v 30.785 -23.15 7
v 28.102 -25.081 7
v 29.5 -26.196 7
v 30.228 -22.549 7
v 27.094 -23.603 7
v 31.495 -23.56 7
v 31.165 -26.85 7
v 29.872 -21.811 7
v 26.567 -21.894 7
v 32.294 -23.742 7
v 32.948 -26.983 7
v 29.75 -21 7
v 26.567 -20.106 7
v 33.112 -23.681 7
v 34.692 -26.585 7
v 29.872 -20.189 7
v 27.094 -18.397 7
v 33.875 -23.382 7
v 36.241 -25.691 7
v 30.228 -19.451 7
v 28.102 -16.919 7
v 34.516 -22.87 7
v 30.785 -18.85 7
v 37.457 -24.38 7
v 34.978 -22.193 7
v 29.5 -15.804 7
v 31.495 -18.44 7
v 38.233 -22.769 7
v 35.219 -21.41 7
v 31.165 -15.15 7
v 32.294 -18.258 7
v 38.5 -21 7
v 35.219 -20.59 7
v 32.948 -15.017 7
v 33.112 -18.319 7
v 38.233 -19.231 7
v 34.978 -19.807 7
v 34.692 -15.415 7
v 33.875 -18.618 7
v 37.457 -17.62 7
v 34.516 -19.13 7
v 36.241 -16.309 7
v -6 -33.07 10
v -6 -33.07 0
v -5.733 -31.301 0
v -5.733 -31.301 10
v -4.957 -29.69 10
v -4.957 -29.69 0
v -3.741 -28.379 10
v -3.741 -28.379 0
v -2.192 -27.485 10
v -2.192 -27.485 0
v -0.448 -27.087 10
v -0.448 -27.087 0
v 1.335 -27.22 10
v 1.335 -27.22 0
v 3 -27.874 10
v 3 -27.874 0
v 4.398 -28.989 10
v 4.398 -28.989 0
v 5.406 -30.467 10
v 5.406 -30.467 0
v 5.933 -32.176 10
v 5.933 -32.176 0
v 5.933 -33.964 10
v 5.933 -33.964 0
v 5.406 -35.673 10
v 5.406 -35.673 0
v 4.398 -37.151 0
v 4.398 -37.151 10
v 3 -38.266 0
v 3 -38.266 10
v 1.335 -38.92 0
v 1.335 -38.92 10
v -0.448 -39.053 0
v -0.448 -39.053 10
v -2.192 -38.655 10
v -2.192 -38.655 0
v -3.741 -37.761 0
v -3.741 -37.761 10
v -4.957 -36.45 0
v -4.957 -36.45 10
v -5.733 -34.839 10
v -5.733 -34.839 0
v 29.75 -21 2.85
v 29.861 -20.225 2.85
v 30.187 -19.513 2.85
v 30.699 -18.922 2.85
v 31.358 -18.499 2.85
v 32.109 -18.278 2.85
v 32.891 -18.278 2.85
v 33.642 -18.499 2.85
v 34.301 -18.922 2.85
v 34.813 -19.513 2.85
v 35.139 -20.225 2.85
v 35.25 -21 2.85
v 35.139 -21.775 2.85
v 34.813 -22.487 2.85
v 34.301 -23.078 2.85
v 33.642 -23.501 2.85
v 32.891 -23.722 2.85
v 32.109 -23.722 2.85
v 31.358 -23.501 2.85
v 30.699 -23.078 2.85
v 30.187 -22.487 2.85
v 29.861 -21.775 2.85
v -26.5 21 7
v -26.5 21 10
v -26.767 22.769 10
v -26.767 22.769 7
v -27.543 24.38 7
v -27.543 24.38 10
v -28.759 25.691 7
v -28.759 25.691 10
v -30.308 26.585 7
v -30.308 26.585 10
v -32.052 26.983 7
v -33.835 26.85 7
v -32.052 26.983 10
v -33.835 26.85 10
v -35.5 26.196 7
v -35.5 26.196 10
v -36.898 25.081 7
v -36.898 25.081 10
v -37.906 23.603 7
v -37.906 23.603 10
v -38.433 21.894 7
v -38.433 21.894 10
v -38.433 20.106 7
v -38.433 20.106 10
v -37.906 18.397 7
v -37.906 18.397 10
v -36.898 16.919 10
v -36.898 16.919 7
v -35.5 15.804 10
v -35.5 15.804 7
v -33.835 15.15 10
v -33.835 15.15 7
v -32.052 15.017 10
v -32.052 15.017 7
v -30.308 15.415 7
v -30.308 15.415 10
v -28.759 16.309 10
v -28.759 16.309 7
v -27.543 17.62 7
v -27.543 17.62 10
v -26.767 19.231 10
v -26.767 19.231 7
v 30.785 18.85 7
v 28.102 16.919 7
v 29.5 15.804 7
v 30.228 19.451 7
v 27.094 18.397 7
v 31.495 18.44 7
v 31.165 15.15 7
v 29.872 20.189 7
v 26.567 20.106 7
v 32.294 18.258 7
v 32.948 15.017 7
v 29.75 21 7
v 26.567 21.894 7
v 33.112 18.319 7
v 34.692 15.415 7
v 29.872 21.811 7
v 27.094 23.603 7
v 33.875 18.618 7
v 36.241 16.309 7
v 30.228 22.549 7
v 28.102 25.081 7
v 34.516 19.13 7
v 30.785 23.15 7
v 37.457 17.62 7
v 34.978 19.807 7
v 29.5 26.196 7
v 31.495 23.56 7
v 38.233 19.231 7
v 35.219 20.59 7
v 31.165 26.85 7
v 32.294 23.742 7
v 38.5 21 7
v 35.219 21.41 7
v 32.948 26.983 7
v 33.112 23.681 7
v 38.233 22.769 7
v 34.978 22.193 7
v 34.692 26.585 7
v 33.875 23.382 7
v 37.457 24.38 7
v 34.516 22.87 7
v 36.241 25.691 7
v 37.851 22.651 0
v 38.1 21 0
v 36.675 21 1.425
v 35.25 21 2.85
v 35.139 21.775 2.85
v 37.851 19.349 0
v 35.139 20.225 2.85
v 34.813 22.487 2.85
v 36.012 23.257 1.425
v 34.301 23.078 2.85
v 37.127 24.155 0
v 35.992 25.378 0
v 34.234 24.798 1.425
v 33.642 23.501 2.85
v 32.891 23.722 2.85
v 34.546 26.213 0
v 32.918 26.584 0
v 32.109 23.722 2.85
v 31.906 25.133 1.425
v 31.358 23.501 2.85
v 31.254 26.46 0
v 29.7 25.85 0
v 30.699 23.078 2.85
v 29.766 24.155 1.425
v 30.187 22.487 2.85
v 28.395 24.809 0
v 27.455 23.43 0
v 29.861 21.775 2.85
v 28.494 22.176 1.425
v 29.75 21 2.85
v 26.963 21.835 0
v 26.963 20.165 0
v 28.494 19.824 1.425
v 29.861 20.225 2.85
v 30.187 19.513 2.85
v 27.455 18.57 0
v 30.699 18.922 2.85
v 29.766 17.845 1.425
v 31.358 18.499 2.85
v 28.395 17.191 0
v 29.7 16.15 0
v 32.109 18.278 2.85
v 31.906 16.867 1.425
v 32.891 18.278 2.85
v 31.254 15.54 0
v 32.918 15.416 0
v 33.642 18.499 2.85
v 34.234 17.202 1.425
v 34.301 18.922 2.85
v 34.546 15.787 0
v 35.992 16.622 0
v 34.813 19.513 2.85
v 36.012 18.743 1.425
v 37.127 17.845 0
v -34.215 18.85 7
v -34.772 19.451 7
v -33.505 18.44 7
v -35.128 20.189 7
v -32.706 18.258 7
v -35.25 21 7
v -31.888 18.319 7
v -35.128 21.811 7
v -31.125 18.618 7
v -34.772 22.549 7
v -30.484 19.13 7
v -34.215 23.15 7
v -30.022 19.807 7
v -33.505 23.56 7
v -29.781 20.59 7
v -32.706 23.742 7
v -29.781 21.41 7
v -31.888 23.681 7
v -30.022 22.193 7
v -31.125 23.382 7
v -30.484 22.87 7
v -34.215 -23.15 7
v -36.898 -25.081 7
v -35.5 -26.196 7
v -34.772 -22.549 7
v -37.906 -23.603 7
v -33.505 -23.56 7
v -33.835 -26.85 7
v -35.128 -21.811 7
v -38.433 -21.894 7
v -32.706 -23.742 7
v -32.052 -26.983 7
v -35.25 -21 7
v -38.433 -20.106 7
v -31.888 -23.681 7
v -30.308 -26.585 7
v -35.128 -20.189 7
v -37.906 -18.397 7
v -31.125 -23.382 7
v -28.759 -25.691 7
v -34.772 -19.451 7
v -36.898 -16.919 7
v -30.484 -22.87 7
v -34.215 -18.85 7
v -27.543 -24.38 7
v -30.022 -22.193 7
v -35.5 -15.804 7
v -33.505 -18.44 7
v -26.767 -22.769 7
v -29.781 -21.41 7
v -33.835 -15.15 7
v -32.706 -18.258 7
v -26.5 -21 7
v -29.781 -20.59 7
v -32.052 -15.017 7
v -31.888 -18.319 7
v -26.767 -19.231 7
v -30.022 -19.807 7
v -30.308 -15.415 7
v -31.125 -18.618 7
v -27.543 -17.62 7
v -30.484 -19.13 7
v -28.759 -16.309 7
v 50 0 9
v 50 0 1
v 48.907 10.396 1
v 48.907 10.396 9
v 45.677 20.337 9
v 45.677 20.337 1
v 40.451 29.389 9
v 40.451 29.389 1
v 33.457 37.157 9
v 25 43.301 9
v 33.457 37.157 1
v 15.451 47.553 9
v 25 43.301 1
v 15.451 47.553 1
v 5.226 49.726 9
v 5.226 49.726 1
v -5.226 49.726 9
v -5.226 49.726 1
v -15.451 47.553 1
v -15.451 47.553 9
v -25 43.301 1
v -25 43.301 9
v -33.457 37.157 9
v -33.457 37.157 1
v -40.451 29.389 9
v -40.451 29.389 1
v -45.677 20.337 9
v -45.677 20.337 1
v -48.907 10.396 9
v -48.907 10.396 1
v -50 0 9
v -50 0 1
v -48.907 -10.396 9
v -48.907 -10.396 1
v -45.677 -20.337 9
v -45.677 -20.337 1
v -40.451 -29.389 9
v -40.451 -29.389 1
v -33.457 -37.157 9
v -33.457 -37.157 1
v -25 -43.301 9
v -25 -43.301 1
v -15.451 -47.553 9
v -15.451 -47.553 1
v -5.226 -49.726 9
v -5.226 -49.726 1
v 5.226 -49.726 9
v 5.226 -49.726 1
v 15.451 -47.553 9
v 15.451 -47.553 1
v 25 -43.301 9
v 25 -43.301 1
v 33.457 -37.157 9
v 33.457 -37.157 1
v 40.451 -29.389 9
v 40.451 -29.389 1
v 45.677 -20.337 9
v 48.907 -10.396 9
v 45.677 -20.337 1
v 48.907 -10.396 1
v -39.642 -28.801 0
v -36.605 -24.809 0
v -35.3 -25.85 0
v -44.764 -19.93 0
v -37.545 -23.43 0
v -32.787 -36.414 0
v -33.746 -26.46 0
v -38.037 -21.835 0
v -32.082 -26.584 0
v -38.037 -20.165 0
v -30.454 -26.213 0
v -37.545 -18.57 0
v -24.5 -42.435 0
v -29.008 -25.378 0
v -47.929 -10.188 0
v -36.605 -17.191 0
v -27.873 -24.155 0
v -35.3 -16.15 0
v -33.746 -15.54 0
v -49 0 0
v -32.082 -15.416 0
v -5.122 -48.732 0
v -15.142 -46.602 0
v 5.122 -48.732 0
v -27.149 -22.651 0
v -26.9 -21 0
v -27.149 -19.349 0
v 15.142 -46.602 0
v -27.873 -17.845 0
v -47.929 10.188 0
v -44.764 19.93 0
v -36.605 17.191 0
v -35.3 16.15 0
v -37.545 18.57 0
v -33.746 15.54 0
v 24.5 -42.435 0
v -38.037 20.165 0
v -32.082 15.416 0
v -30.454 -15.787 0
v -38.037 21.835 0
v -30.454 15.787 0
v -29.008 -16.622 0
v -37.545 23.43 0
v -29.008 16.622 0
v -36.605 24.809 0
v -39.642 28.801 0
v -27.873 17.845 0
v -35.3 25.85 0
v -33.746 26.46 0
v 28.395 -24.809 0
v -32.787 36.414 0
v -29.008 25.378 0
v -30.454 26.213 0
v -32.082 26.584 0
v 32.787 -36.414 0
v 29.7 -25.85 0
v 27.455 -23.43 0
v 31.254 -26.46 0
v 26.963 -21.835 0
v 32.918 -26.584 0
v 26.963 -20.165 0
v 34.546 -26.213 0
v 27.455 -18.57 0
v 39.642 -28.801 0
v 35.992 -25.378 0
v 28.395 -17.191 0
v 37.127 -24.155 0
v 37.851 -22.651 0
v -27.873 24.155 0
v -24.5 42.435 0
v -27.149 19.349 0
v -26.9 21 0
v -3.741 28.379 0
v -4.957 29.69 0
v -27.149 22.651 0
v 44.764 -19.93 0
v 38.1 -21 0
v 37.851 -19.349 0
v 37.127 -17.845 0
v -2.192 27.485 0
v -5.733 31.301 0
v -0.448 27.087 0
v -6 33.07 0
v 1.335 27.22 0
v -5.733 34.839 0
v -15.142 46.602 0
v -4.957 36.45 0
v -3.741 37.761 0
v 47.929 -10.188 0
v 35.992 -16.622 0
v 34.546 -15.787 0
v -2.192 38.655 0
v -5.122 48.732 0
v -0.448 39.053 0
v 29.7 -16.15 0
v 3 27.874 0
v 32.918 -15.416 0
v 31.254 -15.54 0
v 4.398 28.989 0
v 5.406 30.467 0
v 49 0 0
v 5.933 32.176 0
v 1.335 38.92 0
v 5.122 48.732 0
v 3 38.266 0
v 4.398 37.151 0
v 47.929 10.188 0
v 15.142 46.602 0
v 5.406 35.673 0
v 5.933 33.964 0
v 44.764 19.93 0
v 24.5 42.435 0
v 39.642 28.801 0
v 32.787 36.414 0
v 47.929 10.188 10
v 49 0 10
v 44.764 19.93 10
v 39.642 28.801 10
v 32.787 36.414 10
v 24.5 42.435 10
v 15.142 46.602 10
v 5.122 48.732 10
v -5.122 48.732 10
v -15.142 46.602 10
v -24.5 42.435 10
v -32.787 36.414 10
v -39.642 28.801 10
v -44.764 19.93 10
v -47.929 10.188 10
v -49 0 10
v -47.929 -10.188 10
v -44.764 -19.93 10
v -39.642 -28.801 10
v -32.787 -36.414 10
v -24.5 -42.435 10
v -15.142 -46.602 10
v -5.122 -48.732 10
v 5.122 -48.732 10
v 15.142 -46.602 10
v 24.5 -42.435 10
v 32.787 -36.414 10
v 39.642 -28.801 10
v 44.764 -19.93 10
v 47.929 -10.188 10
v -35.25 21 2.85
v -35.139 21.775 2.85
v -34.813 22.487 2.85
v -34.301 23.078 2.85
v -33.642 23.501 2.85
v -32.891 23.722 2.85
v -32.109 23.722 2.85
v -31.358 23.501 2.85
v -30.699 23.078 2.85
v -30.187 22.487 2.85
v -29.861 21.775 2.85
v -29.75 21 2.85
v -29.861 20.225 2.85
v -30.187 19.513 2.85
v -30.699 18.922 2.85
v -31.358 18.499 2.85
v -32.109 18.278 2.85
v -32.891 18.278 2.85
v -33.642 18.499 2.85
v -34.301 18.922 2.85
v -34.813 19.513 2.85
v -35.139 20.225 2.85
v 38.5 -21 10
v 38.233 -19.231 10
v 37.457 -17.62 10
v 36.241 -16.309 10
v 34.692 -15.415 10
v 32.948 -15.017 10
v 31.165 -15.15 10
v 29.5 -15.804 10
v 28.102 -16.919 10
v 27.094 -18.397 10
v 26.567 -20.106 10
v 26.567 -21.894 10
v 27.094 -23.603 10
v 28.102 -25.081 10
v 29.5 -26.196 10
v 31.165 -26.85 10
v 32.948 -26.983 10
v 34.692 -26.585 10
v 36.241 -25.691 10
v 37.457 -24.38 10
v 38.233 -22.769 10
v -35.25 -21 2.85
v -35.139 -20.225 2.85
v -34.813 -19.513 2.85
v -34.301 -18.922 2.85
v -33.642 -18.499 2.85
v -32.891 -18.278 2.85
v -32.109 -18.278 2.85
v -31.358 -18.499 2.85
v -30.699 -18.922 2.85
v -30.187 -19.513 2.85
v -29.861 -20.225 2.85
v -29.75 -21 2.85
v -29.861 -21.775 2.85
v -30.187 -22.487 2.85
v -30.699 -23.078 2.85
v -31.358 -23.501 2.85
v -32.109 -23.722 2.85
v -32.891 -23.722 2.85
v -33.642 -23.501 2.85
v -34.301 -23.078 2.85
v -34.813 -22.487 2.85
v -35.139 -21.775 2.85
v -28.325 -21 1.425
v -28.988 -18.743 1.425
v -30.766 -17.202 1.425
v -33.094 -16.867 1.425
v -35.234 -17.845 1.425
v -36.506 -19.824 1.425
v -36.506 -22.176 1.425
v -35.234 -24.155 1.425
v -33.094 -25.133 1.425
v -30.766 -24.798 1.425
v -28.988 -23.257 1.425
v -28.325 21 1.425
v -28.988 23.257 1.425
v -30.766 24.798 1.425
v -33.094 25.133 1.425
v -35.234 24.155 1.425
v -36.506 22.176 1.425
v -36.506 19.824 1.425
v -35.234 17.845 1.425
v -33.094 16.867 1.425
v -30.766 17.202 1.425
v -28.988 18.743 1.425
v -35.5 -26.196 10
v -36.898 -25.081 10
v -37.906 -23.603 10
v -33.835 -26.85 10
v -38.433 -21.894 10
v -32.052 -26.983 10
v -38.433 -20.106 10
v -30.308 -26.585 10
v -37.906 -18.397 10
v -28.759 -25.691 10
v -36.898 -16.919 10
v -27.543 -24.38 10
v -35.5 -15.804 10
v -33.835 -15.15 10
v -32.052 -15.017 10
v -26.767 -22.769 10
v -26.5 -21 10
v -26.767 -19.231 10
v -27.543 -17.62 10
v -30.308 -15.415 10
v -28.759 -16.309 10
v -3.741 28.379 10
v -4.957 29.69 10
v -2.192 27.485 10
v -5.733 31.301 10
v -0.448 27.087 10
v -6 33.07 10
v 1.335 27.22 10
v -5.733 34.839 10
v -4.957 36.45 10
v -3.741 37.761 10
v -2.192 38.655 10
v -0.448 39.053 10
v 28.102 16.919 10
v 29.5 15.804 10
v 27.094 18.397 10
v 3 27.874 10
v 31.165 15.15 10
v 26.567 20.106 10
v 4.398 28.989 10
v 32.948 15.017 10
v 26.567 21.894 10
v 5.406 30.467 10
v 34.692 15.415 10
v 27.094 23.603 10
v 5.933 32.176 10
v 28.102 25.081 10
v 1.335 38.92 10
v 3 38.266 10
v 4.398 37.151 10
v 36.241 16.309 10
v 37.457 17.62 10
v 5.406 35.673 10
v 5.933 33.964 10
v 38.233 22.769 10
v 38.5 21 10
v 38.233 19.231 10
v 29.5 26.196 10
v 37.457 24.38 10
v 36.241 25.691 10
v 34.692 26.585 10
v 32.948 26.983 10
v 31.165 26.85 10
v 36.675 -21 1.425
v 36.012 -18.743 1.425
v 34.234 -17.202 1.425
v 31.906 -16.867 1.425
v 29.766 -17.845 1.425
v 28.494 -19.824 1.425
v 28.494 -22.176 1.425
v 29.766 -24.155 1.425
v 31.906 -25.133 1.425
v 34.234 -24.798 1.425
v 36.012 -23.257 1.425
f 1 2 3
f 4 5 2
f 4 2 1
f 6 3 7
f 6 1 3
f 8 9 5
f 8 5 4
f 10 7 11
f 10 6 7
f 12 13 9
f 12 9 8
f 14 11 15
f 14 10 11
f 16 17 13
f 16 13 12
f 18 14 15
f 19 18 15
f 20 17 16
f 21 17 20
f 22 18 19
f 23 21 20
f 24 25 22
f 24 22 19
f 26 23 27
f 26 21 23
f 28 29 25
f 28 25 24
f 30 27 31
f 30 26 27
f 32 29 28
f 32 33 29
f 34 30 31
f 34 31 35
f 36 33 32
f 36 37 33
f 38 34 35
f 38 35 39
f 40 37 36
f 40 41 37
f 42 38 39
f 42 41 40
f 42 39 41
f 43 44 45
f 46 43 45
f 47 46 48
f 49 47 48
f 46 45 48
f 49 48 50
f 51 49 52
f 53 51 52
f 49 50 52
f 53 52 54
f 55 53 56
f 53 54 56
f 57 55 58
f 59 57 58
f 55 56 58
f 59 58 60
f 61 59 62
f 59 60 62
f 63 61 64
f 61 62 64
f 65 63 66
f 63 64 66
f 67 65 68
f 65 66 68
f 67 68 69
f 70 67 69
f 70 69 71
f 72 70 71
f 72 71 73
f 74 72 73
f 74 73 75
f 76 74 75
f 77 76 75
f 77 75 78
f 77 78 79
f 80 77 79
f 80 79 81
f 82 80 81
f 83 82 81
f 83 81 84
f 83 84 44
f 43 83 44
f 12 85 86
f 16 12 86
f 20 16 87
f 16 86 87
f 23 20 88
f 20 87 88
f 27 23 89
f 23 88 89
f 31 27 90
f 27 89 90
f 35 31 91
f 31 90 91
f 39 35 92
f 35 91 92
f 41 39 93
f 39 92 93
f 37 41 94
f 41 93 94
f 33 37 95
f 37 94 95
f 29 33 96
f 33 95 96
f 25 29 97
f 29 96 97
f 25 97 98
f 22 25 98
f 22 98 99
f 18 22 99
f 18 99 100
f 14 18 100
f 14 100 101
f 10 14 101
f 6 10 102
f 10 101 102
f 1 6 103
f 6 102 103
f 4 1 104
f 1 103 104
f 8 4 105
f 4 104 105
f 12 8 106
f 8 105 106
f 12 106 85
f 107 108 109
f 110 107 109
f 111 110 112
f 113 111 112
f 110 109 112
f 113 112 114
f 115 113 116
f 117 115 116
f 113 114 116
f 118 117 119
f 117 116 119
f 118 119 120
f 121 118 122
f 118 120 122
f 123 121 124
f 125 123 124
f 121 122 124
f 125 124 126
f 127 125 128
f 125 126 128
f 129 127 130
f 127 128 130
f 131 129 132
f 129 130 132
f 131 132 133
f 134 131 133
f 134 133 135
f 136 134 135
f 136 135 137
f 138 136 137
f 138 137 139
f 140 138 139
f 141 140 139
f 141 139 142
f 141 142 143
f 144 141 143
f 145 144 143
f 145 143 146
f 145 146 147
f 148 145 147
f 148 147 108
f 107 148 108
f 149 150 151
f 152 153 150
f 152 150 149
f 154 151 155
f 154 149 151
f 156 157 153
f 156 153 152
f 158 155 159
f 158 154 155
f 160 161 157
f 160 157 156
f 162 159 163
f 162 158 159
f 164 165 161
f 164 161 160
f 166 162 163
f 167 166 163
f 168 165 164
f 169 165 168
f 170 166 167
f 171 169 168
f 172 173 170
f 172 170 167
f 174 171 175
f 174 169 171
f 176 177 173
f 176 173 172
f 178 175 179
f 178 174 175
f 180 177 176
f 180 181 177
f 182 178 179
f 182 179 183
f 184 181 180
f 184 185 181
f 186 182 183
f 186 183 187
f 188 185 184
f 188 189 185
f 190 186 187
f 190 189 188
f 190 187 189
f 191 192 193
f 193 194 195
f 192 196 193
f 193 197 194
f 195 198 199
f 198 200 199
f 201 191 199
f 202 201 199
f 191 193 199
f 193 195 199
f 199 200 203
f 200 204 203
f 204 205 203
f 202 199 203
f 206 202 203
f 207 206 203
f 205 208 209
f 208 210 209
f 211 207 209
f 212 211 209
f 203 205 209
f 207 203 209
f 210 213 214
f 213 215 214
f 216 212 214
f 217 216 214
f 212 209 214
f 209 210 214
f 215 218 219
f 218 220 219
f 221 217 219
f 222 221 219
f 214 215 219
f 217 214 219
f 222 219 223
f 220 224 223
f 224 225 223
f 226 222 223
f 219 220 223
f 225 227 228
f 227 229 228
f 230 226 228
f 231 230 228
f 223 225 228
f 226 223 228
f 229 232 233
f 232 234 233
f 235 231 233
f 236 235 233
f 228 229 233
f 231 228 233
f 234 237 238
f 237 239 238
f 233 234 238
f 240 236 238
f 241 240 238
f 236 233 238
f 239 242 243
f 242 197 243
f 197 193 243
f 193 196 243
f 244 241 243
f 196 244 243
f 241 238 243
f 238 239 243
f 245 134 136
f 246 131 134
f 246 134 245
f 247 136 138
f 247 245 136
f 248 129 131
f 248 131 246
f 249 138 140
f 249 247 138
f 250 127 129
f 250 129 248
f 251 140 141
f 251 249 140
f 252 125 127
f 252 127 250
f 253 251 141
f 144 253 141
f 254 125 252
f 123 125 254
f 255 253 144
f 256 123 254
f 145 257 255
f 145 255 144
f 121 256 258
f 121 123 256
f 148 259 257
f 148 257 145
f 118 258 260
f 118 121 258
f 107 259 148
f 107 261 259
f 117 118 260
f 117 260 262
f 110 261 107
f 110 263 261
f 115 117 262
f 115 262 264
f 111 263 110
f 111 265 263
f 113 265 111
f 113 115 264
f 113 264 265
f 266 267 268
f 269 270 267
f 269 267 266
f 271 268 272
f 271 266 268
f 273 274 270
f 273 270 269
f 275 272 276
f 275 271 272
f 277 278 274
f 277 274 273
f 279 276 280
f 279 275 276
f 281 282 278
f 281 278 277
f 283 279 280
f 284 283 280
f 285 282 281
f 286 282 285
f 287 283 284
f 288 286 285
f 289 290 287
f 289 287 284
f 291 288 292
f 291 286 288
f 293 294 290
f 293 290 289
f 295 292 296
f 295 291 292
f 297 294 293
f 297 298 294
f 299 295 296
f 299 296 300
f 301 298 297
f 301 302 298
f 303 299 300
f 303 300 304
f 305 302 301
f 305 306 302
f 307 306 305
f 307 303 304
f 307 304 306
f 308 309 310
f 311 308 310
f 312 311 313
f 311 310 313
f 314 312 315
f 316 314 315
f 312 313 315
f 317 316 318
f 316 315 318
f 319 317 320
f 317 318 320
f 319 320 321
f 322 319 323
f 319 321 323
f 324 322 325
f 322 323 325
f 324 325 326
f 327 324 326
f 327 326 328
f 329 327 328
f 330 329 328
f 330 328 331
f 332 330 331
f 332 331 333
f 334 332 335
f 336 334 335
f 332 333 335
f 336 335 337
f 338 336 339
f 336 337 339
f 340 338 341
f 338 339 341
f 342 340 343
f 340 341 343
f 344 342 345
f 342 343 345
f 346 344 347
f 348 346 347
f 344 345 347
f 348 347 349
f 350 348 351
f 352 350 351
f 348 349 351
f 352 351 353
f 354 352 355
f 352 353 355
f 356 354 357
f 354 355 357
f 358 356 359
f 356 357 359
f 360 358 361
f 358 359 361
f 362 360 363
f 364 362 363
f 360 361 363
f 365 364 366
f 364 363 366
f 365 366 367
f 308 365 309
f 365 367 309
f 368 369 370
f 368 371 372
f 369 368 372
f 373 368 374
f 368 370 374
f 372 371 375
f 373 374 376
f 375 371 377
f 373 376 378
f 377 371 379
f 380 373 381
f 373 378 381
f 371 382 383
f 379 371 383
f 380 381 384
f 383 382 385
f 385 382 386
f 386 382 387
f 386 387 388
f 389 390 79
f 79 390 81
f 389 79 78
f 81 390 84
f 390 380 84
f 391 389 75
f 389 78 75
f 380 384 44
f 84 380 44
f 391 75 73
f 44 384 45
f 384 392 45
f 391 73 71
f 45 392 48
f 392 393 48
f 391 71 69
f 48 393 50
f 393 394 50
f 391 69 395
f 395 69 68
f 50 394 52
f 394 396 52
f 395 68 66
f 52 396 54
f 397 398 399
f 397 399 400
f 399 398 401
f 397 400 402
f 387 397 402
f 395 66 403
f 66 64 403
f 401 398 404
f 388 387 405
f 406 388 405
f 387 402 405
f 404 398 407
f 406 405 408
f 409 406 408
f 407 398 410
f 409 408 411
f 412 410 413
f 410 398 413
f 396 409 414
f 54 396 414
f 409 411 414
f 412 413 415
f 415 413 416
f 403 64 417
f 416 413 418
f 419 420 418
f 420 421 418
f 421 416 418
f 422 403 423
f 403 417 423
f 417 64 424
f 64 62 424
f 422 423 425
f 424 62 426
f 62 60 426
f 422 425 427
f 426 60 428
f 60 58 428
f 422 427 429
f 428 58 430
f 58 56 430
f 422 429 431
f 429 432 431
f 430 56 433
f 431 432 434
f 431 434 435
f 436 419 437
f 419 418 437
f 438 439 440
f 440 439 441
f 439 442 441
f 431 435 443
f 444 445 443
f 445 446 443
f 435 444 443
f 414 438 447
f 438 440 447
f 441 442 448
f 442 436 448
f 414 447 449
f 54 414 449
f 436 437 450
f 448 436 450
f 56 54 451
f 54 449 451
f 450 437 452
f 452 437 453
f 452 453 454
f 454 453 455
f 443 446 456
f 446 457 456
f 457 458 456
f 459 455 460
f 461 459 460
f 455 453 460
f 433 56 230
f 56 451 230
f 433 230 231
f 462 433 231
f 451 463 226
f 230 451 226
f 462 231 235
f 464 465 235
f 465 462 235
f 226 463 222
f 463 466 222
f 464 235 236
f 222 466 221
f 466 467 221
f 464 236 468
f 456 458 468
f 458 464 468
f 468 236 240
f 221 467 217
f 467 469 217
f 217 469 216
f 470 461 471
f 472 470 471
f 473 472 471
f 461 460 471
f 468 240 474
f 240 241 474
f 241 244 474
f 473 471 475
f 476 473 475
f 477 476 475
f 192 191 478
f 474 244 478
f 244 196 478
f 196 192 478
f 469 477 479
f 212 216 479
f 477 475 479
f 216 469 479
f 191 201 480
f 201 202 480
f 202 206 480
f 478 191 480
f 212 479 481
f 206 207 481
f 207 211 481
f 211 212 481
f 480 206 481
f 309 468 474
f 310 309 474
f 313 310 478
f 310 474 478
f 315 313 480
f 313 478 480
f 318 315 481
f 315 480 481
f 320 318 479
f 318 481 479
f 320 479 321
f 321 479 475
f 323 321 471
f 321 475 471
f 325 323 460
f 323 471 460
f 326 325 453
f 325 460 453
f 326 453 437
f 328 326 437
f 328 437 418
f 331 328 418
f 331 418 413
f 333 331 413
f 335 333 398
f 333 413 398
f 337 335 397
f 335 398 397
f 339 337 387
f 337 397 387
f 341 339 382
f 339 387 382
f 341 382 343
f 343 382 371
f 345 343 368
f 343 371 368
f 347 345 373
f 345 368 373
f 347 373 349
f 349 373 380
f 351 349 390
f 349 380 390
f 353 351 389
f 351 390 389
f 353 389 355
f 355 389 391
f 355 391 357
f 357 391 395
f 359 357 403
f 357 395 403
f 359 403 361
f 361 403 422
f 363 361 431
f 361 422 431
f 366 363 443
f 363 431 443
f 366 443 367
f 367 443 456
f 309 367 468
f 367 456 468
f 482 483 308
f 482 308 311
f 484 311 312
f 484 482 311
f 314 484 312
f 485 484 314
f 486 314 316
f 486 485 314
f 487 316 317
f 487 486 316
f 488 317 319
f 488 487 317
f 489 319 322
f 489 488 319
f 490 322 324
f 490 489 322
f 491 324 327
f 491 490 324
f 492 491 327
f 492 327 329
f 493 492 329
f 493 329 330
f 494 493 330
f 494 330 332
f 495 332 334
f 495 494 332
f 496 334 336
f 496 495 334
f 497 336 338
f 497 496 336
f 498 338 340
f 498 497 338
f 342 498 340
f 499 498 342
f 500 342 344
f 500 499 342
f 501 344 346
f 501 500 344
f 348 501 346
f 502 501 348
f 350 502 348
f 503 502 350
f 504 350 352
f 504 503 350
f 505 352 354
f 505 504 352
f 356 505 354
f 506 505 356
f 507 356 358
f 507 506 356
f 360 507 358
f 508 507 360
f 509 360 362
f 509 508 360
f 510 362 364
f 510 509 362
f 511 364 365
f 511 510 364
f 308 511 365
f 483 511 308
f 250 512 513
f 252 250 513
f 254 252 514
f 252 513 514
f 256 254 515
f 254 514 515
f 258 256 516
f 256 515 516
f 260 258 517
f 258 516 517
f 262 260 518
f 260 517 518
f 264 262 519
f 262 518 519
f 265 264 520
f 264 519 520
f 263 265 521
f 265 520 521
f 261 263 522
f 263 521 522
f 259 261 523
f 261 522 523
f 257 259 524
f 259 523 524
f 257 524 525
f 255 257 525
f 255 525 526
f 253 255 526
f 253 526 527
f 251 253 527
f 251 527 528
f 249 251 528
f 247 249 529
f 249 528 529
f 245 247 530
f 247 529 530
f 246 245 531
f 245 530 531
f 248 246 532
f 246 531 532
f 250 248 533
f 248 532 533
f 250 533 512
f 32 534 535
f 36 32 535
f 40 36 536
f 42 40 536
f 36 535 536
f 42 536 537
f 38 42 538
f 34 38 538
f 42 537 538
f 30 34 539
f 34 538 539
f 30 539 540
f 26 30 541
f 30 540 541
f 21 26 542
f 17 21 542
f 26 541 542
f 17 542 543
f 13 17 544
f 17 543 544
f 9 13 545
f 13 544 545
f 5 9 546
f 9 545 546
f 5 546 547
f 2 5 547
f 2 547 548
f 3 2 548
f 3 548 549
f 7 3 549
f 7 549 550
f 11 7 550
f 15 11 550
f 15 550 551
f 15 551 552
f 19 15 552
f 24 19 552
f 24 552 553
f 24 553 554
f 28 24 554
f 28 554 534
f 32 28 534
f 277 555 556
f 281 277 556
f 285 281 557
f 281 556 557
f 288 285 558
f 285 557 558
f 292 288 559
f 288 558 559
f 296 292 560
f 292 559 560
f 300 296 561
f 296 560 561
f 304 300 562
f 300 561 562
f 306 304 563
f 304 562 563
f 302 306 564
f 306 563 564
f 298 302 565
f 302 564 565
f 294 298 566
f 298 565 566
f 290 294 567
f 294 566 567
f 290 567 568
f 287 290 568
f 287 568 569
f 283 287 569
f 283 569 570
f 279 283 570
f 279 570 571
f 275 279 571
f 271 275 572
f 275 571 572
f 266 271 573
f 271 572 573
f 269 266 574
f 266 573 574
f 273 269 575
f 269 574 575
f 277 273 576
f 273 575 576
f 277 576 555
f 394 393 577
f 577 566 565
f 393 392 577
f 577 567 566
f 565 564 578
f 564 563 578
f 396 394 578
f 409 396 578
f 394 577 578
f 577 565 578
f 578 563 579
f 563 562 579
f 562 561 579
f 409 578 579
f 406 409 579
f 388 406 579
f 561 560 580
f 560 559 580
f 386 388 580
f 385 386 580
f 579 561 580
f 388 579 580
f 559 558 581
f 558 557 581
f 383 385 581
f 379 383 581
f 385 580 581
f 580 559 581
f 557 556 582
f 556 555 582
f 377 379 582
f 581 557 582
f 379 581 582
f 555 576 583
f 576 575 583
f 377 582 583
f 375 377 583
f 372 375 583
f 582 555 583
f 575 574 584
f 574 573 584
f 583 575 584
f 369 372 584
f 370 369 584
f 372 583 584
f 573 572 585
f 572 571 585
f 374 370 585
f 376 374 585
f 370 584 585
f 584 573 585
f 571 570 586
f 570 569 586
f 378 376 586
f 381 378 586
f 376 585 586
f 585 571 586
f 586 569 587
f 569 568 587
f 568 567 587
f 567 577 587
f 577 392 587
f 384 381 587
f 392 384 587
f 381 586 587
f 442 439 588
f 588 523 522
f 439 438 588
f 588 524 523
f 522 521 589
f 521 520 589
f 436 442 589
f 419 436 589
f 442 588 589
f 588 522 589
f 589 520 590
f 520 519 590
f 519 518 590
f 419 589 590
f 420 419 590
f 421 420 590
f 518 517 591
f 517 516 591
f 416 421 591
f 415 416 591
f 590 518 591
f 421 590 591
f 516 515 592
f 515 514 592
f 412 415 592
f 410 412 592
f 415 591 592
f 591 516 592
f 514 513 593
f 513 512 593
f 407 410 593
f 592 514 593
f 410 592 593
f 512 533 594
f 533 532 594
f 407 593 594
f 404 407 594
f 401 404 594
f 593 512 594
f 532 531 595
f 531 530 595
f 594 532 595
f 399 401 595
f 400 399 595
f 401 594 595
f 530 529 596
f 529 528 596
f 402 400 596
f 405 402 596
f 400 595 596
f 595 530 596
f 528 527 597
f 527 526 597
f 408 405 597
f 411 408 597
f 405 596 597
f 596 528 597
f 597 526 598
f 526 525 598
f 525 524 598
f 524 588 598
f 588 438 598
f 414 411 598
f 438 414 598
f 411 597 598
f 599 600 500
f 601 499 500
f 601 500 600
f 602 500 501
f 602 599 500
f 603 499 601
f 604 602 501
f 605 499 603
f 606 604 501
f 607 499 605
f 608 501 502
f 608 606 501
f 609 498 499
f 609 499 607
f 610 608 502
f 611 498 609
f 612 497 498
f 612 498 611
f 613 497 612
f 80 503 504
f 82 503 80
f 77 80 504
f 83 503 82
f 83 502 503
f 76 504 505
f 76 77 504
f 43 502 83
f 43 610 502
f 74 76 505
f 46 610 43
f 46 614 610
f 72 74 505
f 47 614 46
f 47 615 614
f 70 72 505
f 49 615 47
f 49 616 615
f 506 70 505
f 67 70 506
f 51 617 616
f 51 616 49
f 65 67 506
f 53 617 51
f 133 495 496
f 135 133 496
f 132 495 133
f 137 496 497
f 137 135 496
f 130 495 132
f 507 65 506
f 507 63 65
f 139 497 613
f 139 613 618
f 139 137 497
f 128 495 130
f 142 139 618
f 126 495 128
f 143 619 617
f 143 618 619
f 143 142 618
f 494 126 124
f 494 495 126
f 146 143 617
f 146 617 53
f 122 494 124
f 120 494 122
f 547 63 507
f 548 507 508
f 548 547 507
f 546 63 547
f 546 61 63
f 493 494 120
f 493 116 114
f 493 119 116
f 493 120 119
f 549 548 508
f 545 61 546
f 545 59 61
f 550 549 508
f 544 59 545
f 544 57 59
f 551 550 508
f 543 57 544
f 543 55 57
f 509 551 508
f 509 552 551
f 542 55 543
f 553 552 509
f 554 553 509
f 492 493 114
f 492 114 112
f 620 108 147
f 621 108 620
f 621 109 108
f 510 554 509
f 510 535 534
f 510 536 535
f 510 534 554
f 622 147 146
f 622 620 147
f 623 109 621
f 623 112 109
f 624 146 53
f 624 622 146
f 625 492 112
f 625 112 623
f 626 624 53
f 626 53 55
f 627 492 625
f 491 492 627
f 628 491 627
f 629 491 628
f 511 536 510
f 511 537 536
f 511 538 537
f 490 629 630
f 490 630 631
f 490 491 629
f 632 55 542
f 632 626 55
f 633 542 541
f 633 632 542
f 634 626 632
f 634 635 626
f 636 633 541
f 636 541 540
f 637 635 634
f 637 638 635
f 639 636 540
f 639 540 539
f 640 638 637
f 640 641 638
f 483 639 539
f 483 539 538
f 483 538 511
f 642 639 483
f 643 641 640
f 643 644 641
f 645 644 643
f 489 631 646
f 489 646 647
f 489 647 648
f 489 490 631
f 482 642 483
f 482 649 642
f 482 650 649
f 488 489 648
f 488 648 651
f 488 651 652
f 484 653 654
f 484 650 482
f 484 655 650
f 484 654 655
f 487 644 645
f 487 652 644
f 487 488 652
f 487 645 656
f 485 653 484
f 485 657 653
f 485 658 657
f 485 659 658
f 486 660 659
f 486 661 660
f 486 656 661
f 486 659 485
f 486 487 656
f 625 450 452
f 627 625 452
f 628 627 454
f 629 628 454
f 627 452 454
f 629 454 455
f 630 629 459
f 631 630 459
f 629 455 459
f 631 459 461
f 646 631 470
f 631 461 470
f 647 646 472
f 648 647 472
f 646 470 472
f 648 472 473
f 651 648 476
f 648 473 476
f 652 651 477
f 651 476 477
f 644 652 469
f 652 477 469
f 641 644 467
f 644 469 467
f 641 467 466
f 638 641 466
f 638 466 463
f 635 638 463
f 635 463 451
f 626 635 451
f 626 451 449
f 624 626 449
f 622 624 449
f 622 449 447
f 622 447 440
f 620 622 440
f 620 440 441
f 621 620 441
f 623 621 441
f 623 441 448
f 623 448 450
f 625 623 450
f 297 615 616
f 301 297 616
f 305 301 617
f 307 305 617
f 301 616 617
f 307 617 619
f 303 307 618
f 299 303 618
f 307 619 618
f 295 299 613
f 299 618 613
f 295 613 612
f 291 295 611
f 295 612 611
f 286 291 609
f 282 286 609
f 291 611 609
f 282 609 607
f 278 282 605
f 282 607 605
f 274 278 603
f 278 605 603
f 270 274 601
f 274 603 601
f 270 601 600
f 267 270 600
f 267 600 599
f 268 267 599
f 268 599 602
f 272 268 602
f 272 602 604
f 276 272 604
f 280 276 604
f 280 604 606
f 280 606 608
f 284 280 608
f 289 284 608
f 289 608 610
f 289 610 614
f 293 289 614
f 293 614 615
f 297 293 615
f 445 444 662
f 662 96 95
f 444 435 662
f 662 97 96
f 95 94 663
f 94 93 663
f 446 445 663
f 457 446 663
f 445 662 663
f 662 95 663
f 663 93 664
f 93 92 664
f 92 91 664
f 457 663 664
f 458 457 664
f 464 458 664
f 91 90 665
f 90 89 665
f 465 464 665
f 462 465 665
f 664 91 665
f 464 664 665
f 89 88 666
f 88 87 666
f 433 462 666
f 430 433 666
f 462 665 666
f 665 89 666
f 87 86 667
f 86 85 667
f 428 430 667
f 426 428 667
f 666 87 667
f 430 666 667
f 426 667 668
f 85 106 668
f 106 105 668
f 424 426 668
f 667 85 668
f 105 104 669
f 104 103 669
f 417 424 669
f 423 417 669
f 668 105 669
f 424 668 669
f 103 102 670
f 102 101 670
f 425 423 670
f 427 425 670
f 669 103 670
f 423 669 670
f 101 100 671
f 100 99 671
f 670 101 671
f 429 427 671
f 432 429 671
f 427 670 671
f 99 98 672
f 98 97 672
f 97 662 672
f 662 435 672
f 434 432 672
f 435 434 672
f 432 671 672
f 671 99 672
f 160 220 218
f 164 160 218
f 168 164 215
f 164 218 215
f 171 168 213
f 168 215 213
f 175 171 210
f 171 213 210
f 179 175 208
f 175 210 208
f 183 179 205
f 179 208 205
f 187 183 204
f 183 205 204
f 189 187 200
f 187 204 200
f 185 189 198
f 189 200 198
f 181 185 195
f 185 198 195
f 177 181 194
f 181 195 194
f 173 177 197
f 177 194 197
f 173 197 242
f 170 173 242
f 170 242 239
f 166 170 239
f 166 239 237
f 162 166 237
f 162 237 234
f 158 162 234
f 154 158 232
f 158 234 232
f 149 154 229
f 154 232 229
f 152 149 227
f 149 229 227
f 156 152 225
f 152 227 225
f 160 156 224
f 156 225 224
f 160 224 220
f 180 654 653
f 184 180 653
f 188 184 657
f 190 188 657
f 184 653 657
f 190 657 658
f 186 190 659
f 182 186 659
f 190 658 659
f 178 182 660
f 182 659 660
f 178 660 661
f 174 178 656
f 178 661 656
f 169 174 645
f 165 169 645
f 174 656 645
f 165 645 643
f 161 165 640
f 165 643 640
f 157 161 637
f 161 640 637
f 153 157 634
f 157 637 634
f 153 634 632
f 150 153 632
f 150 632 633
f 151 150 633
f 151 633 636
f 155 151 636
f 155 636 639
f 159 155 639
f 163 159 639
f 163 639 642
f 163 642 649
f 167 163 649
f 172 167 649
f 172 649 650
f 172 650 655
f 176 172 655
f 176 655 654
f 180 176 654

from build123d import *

# Parameters (mm, degrees)
SKETCH1_R                                            = 50
BOSS_EXTRUDE1_DEPTH                                  = 10
CBORE_FOR_M6_HEX_SOCKET_HEAD_CAP_SCREW1_D            = 5.5
CBORE_FOR_M6_HEX_SOCKET_HEAD_CAP_SCREW1_CBORE_D      = 12
CBORE_FOR_M6_HEX_SOCKET_HEAD_CAP_SCREW1_CBORE_DEPTH  = 3
F_12_0_12_DIAMETER_HOLE1_D                           = 12
CSK_FOR_M3_HEX_SOCKET_COUNTERSUNK_CAP_SC_D           = 5.5
CSK_FOR_M3_HEX_SOCKET_COUNTERSUNK_CAP_SC_CSINK_D     = 11.2
CSK_FOR_M3_HEX_SOCKET_COUNTERSUNK_CAP_SC_CSINK_ANGLE = 90
CHAMFER1_SIZE                                        = 1


with BuildPart() as part:
    # Sketch1 → Boss-Extrude1 (new body)
    with BuildSketch(Plane.XY):
        Circle(SKETCH1_R)
    extrude(amount=BOSS_EXTRUDE1_DEPTH)

    # CBORE for M6 Hex Socket Head Cap Screw1 (through all)
    with Locations(Plane.XY.offset(10)):
        with Locations((-32.5, 21), (32.5, 21), (32.5, -21), (-32.5, -21)):
            CounterBoreHole(CBORE_FOR_M6_HEX_SOCKET_HEAD_CAP_SCREW1_D / 2, CBORE_FOR_M6_HEX_SOCKET_HEAD_CAP_SCREW1_CBORE_D / 2, CBORE_FOR_M6_HEX_SOCKET_HEAD_CAP_SCREW1_CBORE_DEPTH)

    # Ø12.0 (12) Diameter Hole1 (through all)
    with Locations(Plane.XY.offset(10)):
        with Locations((0, 33.07), (0, -33.07)):
            Hole(F_12_0_12_DIAMETER_HOLE1_D / 2)

    # CSK for M3 Hex Socket Countersunk Cap Screw1 (through all)
    with Locations(Plane(origin=(0, 0, 0), x_dir=(-1, 0, 0), z_dir=(0, 0, -1))):
        with Locations((-32.5, 21), (-32.5, -21), (32.5, -21), (32.5, 21)):
            CounterSinkHole(CSK_FOR_M3_HEX_SOCKET_COUNTERSUNK_CAP_SC_D / 2, CSK_FOR_M3_HEX_SOCKET_COUNTERSUNK_CAP_SC_CSINK_D / 2, counter_sink_angle=CSK_FOR_M3_HEX_SOCKET_COUNTERSUNK_CAP_SC_CSINK_ANGLE)

    # Chamfer1
    chamfer1_edges = [part.edges().sort_by_distance(p)[0] for p in [
        (-50, 0, 0),
        (-50, 0, 10),
    ]]
    chamfer(chamfer1_edges, length=CHAMFER1_SIZE)


solid = part.part
